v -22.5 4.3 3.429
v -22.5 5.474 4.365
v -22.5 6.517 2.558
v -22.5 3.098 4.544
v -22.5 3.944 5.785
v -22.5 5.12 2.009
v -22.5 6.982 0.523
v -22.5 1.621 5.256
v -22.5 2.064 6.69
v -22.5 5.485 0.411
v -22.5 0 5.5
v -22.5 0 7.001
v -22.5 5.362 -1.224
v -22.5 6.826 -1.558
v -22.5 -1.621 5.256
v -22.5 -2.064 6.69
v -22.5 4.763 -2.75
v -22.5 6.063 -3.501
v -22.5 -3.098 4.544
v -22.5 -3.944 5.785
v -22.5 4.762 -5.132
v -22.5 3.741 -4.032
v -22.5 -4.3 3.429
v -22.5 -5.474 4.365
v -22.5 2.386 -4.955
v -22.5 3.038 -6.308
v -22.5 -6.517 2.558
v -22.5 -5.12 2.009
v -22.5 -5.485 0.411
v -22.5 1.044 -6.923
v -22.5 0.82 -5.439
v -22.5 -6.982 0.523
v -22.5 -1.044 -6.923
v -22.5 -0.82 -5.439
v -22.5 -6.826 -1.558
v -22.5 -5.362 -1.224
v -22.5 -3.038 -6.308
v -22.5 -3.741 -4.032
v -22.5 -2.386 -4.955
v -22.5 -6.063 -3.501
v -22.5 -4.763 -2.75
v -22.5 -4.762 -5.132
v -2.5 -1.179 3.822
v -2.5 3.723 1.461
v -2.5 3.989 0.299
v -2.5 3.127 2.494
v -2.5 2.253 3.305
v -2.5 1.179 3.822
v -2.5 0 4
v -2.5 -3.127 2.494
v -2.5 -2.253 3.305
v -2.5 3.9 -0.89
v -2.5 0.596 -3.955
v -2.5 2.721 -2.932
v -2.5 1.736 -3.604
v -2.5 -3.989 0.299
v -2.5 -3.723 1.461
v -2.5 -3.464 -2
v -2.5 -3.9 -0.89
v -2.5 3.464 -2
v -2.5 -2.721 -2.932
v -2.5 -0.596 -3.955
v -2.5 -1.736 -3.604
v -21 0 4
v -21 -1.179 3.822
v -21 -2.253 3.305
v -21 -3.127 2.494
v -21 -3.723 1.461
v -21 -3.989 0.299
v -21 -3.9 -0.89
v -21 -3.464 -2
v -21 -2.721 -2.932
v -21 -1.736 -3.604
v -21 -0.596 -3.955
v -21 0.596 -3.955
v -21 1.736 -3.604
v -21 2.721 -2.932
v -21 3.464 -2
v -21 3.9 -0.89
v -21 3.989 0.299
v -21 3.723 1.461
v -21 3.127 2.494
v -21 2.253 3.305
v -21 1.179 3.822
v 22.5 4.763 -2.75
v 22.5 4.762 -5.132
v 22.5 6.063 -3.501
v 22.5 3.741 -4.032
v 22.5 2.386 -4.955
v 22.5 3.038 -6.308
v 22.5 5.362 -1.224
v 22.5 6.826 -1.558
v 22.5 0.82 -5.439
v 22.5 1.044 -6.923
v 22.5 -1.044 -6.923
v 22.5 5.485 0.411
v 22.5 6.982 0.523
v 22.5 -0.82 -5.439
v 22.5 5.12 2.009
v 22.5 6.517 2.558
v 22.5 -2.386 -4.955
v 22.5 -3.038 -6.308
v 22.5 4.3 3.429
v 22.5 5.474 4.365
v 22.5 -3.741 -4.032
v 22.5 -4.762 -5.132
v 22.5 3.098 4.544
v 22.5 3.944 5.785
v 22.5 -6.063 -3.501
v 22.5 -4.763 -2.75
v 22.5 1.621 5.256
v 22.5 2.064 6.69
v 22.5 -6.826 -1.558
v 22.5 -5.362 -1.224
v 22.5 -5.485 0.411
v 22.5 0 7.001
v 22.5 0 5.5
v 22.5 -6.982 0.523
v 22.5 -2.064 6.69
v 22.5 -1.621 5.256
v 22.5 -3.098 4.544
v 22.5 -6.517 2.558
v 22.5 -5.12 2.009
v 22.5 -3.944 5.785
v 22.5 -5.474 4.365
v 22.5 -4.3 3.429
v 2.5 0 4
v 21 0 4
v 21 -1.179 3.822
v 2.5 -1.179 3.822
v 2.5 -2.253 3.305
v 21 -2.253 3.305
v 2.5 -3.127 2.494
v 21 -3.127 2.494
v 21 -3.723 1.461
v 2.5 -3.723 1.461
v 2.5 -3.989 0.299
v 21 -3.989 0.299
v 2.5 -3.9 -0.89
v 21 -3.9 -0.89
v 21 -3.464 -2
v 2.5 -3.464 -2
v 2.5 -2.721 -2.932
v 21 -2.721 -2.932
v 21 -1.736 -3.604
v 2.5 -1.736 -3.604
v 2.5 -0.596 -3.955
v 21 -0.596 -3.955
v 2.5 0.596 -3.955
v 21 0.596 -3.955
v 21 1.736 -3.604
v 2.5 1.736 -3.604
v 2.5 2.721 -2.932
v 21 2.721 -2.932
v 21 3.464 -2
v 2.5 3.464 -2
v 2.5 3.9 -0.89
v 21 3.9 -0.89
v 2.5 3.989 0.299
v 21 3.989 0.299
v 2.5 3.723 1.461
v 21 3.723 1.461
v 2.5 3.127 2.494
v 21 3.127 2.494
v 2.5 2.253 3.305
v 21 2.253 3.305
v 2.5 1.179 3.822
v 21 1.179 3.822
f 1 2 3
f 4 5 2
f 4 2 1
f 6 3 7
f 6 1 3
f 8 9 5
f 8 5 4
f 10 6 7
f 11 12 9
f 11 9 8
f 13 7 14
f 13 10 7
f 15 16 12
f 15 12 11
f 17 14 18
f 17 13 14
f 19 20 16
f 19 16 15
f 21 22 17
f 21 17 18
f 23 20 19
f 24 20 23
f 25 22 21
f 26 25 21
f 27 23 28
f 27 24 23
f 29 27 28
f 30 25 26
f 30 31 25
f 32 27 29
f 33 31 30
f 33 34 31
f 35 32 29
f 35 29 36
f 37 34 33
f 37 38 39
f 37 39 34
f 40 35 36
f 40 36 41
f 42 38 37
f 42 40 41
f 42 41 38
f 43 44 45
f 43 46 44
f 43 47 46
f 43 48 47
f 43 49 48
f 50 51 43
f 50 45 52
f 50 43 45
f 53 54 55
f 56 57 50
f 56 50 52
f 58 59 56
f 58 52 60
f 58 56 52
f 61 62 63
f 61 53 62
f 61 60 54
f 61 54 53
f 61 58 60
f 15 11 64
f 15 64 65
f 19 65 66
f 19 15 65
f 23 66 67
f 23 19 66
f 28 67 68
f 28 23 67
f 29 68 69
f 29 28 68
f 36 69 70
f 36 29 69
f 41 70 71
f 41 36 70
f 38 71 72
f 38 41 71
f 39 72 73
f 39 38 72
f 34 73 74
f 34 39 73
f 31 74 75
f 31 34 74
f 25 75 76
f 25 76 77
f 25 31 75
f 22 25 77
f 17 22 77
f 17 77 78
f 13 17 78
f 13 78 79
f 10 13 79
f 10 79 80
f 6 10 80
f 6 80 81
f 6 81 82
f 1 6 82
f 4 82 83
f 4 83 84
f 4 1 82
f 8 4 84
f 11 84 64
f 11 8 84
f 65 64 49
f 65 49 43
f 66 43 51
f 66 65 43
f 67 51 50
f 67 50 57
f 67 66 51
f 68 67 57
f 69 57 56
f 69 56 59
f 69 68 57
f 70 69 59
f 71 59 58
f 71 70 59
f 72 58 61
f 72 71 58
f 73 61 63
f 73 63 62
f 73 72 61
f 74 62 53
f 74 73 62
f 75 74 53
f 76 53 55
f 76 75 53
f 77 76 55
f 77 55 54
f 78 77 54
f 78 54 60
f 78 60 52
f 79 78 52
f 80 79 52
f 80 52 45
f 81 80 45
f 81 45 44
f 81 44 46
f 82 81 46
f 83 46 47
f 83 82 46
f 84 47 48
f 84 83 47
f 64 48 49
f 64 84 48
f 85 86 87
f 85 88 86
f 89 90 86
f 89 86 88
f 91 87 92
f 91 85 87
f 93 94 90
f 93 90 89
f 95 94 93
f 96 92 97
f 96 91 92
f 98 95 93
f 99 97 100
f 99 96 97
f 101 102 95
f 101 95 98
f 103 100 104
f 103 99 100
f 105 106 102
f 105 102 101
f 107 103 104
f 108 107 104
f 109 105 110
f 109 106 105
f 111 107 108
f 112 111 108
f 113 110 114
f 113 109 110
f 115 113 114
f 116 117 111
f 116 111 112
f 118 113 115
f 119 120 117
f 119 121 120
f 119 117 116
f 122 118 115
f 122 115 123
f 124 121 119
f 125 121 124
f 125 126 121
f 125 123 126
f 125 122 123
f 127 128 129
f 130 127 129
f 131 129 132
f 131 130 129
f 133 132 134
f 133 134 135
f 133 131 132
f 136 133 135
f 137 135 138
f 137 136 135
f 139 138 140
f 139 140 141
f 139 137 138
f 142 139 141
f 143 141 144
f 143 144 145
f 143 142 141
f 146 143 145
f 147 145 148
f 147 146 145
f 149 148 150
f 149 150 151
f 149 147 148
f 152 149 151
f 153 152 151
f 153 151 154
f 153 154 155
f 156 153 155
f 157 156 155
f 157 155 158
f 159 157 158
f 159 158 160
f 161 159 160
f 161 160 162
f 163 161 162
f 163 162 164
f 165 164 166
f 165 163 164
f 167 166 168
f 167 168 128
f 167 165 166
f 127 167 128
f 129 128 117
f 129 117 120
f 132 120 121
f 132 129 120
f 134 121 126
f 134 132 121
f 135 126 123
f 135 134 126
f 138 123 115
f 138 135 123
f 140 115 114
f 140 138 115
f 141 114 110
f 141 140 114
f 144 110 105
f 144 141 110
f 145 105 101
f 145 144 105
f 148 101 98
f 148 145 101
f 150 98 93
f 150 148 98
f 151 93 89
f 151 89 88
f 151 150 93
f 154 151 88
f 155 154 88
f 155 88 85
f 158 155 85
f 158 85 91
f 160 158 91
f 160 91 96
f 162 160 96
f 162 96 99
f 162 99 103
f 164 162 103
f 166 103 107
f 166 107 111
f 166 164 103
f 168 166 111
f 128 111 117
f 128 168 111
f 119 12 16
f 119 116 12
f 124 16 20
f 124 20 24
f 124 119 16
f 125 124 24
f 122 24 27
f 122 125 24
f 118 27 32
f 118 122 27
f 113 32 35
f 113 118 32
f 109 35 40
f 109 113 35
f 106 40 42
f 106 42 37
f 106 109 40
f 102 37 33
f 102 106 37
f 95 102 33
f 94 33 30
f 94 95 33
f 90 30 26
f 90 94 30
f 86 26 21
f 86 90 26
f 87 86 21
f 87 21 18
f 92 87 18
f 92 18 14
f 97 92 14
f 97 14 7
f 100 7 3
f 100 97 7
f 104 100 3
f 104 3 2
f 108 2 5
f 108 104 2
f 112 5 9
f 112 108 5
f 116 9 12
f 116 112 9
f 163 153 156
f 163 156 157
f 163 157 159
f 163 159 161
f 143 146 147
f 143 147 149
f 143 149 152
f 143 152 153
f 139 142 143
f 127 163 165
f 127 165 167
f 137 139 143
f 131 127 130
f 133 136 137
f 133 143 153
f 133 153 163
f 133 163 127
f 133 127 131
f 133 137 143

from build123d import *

# Parameters (mm, degrees)
CHAMFER1_SIZE = 1.5


with BuildPart() as part:
    # Sketch1 → Revolve1 (revolve)
    with BuildSketch(Plane.XY, mode=Mode.PRIVATE) as revolve1_sk:
        Polygon((-2.5, 0), (-2.5, 4), (-22.5, 4), (-22.5, 7.00143885), (22.5, 7.00143885), (22.5, 4), (2.5, 4), (2.5, 0), align=None)
    revolve(revolve1_sk.sketch.rotate(Axis((0, 0, 0), (1, 0, 0)), 90), axis=Axis((0, 0, 0), (1, 0, 0)))

    # Chamfer1
    chamfer1_edges = [part.edges().sort_by_distance(p)[0] for p in [
        (22.5, 0, -4),
        (-22.5, 0, -4),
    ]]
    chamfer(chamfer1_edges, length=CHAMFER1_SIZE)


solid = part.part
